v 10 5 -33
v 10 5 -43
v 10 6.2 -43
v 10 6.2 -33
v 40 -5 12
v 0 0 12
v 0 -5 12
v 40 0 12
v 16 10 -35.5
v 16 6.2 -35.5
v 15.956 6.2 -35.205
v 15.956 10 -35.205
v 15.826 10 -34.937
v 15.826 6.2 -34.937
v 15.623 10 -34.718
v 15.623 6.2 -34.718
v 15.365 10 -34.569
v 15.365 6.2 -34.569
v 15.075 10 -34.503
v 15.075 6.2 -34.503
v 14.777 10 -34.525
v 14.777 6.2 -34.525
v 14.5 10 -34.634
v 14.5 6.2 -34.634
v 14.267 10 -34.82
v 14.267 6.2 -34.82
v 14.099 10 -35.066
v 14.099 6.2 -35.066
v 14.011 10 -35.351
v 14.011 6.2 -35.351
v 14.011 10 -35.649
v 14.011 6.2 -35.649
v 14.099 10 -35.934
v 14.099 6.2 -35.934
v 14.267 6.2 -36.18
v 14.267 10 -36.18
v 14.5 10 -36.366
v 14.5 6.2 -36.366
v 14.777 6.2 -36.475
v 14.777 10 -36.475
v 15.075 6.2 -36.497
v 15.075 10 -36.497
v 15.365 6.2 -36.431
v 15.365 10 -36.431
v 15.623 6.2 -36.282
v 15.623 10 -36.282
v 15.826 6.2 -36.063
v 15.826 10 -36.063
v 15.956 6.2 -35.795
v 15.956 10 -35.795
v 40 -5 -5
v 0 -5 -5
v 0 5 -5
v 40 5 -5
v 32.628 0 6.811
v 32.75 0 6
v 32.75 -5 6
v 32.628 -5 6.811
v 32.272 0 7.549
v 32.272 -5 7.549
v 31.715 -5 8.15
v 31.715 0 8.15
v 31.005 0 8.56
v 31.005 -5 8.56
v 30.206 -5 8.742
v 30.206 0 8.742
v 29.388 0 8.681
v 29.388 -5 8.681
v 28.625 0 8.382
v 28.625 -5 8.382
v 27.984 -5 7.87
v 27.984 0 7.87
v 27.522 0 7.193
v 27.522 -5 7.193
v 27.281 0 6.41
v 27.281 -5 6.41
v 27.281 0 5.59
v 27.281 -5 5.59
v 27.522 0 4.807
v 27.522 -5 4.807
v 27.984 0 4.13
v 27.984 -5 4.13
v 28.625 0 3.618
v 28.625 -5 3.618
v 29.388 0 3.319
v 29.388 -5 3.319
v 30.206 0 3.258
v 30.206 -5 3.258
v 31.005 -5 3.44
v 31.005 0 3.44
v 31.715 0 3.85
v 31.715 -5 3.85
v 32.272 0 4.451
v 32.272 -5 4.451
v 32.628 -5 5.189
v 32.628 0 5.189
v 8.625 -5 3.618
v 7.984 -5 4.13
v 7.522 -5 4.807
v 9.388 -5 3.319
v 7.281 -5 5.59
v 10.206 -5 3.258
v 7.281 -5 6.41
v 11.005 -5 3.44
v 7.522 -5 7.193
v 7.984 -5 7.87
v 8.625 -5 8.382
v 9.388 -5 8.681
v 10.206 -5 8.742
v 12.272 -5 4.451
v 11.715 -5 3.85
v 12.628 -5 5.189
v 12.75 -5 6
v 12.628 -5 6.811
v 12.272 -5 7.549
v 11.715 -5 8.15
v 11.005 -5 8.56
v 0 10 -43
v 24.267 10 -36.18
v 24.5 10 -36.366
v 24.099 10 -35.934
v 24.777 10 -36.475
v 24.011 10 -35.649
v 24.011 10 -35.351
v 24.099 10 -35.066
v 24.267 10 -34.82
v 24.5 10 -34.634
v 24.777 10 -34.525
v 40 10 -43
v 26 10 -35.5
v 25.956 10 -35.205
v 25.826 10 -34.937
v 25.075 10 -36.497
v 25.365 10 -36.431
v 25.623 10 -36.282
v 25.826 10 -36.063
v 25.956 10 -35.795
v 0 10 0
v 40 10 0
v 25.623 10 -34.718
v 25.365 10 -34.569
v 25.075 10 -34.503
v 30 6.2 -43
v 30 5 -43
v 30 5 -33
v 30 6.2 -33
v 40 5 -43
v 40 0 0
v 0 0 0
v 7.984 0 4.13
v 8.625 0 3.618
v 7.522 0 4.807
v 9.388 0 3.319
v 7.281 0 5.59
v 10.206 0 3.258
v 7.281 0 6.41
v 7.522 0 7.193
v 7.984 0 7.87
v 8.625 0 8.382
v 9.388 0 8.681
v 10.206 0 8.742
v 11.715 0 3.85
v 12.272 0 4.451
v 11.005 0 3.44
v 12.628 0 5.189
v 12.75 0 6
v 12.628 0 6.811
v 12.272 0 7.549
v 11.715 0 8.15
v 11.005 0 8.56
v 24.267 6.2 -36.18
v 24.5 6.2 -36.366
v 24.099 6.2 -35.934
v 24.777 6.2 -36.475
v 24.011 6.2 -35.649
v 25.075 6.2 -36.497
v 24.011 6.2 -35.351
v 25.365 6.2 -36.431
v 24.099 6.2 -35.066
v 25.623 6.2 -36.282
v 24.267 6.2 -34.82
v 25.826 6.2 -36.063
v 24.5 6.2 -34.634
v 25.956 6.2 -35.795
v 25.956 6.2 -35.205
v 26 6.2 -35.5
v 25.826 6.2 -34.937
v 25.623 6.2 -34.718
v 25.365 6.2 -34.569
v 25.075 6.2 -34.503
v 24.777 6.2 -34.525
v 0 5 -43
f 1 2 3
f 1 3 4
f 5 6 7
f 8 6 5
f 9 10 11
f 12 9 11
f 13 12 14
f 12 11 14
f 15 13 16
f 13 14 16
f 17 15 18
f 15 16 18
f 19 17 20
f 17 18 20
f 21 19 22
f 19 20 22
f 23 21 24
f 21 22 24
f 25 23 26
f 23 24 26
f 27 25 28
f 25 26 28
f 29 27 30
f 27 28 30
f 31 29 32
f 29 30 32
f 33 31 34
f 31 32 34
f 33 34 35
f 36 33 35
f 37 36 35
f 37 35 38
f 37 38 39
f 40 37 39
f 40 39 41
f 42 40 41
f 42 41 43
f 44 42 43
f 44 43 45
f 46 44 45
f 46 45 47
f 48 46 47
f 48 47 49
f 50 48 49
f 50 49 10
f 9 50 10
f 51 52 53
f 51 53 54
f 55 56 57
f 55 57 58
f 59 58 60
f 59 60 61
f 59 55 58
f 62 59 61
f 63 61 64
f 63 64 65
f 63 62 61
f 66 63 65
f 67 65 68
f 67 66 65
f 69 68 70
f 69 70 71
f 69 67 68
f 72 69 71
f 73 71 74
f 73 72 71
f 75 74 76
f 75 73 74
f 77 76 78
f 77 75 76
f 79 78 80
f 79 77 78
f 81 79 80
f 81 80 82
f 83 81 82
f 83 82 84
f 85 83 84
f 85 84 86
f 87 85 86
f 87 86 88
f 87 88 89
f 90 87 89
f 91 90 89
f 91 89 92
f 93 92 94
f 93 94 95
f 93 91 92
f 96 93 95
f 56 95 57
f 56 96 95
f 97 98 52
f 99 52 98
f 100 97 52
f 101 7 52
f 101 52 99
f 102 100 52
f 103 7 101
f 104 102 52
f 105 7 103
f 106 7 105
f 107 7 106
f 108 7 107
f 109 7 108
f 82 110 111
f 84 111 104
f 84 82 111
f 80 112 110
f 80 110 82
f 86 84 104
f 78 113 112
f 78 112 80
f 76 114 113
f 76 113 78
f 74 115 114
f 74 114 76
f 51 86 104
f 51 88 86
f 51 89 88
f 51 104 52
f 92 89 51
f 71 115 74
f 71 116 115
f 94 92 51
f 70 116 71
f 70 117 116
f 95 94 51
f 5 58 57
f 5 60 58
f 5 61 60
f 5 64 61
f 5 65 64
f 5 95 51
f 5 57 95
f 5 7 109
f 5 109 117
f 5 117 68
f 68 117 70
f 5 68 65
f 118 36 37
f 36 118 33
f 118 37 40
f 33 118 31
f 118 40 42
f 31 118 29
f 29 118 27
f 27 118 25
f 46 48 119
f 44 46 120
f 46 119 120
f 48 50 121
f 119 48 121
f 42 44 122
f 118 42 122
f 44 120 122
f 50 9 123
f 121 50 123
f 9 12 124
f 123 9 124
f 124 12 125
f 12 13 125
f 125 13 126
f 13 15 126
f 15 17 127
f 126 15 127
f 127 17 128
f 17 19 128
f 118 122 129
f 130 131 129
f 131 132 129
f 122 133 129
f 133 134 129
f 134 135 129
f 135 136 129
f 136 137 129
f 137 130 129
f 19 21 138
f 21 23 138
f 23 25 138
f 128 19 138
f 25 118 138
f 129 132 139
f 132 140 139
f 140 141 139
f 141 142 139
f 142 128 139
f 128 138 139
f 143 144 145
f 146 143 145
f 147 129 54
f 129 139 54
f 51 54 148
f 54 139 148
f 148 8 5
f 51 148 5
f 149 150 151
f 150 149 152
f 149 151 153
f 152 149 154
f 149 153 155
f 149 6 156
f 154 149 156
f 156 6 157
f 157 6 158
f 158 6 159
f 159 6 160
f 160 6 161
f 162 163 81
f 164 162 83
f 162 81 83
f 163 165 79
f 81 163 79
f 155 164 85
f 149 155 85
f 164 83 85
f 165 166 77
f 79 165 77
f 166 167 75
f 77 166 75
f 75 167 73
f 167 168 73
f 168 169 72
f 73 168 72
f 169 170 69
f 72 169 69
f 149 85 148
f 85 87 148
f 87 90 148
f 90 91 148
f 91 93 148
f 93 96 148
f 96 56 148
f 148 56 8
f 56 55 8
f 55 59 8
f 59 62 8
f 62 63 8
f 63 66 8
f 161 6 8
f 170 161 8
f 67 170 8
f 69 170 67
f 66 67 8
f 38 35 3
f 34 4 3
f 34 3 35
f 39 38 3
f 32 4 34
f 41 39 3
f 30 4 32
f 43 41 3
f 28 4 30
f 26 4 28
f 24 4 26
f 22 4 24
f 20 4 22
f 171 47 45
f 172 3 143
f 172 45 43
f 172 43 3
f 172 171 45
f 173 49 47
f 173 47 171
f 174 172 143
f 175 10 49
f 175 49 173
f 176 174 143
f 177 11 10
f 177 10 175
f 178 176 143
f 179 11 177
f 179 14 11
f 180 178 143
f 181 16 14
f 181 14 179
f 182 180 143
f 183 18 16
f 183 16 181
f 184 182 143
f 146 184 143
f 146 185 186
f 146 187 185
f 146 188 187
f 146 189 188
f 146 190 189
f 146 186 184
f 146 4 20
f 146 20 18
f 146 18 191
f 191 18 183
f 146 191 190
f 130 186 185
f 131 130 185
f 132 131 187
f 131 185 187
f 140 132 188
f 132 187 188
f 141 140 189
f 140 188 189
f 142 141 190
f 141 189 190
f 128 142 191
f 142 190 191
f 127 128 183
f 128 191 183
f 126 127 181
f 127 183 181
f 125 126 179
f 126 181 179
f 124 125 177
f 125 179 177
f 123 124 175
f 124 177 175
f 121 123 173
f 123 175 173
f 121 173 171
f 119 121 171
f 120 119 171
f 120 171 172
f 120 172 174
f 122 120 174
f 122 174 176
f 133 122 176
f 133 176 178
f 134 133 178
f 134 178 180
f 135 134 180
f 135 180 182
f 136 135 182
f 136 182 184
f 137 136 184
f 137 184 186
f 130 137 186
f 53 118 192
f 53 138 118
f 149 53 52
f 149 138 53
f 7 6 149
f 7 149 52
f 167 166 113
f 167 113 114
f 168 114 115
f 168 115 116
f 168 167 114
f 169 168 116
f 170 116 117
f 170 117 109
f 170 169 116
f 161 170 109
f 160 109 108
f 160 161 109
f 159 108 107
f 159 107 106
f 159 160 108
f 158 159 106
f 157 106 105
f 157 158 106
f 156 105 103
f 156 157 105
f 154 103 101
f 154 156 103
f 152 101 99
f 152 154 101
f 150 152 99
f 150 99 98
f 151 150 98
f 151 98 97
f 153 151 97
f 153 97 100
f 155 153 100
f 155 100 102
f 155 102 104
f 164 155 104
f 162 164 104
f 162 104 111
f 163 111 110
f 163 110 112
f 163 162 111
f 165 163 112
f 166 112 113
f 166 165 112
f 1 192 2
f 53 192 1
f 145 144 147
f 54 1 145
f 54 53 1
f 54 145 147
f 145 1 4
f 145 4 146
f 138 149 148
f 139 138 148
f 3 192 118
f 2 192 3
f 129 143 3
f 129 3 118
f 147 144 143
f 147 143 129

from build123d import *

# Parameters (mm, degrees)
F0_W     = 40
F0_H     = 12
F0_R     = 2.75
F1_DEPTH = 5
F2_W     = 40
F2_H     = 10
F2_H_2   = 5
F3_DEPTH = 5
F4_W     = 40
F4_H     = 5
F5_DEPTH = 38
F6_W     = 20
F6_H     = 10
F7_DEPTH = 1.2
F8_R     = 1
F9_DEPTH = 25


with BuildPart() as f1:
    # F0 (on Front) → F1 (new body)
    with BuildSketch(Plane.XZ):
        with Locations((20, 6)):
            Rectangle(F0_W, F0_H)
        with Locations((10, 6)):
            Circle(F0_R, mode=Mode.SUBTRACT)
        with Locations((30, 6)):
            Circle(F0_R, mode=Mode.SUBTRACT)
    extrude(amount=F1_DEPTH)

    # F2 (on face) → F3 (join)
    with BuildSketch(Plane(origin=(0, 0, 0), x_dir=(1, 0, 0), z_dir=(0, 0, -1))):
        with Locations((20, -5)):
            Rectangle(F2_W, F2_H)
        with Locations((20, 2.5)):
            Rectangle(F2_W, F2_H_2)
    extrude(amount=F3_DEPTH)

    # F4 (on face) → F5 (join)
    with BuildSketch(Plane(origin=(0, 0, -5), x_dir=(1, 0, 0), z_dir=(0, 0, -1))):
        with Locations((20, -7.5)):
            Rectangle(F4_W, F4_H)
    extrude(amount=F5_DEPTH)

    # F6 (on face) → F7 (cut)
    with BuildSketch(Plane.XZ.offset(-5)):
        with Locations((20, -38)):
            Rectangle(F6_W, F6_H)
    extrude(amount=-F7_DEPTH, mode=Mode.SUBTRACT)

    # F8 (on face) → F9 (cut)
    with BuildSketch(Plane.XZ.offset(-6.2)):
        with Locations((15, -35.5)):
            Circle(F8_R)
        with Locations((25, -35.5)):
            Circle(F8_R)
    extrude(amount=-F9_DEPTH, mode=Mode.SUBTRACT)


solid = f1.part
